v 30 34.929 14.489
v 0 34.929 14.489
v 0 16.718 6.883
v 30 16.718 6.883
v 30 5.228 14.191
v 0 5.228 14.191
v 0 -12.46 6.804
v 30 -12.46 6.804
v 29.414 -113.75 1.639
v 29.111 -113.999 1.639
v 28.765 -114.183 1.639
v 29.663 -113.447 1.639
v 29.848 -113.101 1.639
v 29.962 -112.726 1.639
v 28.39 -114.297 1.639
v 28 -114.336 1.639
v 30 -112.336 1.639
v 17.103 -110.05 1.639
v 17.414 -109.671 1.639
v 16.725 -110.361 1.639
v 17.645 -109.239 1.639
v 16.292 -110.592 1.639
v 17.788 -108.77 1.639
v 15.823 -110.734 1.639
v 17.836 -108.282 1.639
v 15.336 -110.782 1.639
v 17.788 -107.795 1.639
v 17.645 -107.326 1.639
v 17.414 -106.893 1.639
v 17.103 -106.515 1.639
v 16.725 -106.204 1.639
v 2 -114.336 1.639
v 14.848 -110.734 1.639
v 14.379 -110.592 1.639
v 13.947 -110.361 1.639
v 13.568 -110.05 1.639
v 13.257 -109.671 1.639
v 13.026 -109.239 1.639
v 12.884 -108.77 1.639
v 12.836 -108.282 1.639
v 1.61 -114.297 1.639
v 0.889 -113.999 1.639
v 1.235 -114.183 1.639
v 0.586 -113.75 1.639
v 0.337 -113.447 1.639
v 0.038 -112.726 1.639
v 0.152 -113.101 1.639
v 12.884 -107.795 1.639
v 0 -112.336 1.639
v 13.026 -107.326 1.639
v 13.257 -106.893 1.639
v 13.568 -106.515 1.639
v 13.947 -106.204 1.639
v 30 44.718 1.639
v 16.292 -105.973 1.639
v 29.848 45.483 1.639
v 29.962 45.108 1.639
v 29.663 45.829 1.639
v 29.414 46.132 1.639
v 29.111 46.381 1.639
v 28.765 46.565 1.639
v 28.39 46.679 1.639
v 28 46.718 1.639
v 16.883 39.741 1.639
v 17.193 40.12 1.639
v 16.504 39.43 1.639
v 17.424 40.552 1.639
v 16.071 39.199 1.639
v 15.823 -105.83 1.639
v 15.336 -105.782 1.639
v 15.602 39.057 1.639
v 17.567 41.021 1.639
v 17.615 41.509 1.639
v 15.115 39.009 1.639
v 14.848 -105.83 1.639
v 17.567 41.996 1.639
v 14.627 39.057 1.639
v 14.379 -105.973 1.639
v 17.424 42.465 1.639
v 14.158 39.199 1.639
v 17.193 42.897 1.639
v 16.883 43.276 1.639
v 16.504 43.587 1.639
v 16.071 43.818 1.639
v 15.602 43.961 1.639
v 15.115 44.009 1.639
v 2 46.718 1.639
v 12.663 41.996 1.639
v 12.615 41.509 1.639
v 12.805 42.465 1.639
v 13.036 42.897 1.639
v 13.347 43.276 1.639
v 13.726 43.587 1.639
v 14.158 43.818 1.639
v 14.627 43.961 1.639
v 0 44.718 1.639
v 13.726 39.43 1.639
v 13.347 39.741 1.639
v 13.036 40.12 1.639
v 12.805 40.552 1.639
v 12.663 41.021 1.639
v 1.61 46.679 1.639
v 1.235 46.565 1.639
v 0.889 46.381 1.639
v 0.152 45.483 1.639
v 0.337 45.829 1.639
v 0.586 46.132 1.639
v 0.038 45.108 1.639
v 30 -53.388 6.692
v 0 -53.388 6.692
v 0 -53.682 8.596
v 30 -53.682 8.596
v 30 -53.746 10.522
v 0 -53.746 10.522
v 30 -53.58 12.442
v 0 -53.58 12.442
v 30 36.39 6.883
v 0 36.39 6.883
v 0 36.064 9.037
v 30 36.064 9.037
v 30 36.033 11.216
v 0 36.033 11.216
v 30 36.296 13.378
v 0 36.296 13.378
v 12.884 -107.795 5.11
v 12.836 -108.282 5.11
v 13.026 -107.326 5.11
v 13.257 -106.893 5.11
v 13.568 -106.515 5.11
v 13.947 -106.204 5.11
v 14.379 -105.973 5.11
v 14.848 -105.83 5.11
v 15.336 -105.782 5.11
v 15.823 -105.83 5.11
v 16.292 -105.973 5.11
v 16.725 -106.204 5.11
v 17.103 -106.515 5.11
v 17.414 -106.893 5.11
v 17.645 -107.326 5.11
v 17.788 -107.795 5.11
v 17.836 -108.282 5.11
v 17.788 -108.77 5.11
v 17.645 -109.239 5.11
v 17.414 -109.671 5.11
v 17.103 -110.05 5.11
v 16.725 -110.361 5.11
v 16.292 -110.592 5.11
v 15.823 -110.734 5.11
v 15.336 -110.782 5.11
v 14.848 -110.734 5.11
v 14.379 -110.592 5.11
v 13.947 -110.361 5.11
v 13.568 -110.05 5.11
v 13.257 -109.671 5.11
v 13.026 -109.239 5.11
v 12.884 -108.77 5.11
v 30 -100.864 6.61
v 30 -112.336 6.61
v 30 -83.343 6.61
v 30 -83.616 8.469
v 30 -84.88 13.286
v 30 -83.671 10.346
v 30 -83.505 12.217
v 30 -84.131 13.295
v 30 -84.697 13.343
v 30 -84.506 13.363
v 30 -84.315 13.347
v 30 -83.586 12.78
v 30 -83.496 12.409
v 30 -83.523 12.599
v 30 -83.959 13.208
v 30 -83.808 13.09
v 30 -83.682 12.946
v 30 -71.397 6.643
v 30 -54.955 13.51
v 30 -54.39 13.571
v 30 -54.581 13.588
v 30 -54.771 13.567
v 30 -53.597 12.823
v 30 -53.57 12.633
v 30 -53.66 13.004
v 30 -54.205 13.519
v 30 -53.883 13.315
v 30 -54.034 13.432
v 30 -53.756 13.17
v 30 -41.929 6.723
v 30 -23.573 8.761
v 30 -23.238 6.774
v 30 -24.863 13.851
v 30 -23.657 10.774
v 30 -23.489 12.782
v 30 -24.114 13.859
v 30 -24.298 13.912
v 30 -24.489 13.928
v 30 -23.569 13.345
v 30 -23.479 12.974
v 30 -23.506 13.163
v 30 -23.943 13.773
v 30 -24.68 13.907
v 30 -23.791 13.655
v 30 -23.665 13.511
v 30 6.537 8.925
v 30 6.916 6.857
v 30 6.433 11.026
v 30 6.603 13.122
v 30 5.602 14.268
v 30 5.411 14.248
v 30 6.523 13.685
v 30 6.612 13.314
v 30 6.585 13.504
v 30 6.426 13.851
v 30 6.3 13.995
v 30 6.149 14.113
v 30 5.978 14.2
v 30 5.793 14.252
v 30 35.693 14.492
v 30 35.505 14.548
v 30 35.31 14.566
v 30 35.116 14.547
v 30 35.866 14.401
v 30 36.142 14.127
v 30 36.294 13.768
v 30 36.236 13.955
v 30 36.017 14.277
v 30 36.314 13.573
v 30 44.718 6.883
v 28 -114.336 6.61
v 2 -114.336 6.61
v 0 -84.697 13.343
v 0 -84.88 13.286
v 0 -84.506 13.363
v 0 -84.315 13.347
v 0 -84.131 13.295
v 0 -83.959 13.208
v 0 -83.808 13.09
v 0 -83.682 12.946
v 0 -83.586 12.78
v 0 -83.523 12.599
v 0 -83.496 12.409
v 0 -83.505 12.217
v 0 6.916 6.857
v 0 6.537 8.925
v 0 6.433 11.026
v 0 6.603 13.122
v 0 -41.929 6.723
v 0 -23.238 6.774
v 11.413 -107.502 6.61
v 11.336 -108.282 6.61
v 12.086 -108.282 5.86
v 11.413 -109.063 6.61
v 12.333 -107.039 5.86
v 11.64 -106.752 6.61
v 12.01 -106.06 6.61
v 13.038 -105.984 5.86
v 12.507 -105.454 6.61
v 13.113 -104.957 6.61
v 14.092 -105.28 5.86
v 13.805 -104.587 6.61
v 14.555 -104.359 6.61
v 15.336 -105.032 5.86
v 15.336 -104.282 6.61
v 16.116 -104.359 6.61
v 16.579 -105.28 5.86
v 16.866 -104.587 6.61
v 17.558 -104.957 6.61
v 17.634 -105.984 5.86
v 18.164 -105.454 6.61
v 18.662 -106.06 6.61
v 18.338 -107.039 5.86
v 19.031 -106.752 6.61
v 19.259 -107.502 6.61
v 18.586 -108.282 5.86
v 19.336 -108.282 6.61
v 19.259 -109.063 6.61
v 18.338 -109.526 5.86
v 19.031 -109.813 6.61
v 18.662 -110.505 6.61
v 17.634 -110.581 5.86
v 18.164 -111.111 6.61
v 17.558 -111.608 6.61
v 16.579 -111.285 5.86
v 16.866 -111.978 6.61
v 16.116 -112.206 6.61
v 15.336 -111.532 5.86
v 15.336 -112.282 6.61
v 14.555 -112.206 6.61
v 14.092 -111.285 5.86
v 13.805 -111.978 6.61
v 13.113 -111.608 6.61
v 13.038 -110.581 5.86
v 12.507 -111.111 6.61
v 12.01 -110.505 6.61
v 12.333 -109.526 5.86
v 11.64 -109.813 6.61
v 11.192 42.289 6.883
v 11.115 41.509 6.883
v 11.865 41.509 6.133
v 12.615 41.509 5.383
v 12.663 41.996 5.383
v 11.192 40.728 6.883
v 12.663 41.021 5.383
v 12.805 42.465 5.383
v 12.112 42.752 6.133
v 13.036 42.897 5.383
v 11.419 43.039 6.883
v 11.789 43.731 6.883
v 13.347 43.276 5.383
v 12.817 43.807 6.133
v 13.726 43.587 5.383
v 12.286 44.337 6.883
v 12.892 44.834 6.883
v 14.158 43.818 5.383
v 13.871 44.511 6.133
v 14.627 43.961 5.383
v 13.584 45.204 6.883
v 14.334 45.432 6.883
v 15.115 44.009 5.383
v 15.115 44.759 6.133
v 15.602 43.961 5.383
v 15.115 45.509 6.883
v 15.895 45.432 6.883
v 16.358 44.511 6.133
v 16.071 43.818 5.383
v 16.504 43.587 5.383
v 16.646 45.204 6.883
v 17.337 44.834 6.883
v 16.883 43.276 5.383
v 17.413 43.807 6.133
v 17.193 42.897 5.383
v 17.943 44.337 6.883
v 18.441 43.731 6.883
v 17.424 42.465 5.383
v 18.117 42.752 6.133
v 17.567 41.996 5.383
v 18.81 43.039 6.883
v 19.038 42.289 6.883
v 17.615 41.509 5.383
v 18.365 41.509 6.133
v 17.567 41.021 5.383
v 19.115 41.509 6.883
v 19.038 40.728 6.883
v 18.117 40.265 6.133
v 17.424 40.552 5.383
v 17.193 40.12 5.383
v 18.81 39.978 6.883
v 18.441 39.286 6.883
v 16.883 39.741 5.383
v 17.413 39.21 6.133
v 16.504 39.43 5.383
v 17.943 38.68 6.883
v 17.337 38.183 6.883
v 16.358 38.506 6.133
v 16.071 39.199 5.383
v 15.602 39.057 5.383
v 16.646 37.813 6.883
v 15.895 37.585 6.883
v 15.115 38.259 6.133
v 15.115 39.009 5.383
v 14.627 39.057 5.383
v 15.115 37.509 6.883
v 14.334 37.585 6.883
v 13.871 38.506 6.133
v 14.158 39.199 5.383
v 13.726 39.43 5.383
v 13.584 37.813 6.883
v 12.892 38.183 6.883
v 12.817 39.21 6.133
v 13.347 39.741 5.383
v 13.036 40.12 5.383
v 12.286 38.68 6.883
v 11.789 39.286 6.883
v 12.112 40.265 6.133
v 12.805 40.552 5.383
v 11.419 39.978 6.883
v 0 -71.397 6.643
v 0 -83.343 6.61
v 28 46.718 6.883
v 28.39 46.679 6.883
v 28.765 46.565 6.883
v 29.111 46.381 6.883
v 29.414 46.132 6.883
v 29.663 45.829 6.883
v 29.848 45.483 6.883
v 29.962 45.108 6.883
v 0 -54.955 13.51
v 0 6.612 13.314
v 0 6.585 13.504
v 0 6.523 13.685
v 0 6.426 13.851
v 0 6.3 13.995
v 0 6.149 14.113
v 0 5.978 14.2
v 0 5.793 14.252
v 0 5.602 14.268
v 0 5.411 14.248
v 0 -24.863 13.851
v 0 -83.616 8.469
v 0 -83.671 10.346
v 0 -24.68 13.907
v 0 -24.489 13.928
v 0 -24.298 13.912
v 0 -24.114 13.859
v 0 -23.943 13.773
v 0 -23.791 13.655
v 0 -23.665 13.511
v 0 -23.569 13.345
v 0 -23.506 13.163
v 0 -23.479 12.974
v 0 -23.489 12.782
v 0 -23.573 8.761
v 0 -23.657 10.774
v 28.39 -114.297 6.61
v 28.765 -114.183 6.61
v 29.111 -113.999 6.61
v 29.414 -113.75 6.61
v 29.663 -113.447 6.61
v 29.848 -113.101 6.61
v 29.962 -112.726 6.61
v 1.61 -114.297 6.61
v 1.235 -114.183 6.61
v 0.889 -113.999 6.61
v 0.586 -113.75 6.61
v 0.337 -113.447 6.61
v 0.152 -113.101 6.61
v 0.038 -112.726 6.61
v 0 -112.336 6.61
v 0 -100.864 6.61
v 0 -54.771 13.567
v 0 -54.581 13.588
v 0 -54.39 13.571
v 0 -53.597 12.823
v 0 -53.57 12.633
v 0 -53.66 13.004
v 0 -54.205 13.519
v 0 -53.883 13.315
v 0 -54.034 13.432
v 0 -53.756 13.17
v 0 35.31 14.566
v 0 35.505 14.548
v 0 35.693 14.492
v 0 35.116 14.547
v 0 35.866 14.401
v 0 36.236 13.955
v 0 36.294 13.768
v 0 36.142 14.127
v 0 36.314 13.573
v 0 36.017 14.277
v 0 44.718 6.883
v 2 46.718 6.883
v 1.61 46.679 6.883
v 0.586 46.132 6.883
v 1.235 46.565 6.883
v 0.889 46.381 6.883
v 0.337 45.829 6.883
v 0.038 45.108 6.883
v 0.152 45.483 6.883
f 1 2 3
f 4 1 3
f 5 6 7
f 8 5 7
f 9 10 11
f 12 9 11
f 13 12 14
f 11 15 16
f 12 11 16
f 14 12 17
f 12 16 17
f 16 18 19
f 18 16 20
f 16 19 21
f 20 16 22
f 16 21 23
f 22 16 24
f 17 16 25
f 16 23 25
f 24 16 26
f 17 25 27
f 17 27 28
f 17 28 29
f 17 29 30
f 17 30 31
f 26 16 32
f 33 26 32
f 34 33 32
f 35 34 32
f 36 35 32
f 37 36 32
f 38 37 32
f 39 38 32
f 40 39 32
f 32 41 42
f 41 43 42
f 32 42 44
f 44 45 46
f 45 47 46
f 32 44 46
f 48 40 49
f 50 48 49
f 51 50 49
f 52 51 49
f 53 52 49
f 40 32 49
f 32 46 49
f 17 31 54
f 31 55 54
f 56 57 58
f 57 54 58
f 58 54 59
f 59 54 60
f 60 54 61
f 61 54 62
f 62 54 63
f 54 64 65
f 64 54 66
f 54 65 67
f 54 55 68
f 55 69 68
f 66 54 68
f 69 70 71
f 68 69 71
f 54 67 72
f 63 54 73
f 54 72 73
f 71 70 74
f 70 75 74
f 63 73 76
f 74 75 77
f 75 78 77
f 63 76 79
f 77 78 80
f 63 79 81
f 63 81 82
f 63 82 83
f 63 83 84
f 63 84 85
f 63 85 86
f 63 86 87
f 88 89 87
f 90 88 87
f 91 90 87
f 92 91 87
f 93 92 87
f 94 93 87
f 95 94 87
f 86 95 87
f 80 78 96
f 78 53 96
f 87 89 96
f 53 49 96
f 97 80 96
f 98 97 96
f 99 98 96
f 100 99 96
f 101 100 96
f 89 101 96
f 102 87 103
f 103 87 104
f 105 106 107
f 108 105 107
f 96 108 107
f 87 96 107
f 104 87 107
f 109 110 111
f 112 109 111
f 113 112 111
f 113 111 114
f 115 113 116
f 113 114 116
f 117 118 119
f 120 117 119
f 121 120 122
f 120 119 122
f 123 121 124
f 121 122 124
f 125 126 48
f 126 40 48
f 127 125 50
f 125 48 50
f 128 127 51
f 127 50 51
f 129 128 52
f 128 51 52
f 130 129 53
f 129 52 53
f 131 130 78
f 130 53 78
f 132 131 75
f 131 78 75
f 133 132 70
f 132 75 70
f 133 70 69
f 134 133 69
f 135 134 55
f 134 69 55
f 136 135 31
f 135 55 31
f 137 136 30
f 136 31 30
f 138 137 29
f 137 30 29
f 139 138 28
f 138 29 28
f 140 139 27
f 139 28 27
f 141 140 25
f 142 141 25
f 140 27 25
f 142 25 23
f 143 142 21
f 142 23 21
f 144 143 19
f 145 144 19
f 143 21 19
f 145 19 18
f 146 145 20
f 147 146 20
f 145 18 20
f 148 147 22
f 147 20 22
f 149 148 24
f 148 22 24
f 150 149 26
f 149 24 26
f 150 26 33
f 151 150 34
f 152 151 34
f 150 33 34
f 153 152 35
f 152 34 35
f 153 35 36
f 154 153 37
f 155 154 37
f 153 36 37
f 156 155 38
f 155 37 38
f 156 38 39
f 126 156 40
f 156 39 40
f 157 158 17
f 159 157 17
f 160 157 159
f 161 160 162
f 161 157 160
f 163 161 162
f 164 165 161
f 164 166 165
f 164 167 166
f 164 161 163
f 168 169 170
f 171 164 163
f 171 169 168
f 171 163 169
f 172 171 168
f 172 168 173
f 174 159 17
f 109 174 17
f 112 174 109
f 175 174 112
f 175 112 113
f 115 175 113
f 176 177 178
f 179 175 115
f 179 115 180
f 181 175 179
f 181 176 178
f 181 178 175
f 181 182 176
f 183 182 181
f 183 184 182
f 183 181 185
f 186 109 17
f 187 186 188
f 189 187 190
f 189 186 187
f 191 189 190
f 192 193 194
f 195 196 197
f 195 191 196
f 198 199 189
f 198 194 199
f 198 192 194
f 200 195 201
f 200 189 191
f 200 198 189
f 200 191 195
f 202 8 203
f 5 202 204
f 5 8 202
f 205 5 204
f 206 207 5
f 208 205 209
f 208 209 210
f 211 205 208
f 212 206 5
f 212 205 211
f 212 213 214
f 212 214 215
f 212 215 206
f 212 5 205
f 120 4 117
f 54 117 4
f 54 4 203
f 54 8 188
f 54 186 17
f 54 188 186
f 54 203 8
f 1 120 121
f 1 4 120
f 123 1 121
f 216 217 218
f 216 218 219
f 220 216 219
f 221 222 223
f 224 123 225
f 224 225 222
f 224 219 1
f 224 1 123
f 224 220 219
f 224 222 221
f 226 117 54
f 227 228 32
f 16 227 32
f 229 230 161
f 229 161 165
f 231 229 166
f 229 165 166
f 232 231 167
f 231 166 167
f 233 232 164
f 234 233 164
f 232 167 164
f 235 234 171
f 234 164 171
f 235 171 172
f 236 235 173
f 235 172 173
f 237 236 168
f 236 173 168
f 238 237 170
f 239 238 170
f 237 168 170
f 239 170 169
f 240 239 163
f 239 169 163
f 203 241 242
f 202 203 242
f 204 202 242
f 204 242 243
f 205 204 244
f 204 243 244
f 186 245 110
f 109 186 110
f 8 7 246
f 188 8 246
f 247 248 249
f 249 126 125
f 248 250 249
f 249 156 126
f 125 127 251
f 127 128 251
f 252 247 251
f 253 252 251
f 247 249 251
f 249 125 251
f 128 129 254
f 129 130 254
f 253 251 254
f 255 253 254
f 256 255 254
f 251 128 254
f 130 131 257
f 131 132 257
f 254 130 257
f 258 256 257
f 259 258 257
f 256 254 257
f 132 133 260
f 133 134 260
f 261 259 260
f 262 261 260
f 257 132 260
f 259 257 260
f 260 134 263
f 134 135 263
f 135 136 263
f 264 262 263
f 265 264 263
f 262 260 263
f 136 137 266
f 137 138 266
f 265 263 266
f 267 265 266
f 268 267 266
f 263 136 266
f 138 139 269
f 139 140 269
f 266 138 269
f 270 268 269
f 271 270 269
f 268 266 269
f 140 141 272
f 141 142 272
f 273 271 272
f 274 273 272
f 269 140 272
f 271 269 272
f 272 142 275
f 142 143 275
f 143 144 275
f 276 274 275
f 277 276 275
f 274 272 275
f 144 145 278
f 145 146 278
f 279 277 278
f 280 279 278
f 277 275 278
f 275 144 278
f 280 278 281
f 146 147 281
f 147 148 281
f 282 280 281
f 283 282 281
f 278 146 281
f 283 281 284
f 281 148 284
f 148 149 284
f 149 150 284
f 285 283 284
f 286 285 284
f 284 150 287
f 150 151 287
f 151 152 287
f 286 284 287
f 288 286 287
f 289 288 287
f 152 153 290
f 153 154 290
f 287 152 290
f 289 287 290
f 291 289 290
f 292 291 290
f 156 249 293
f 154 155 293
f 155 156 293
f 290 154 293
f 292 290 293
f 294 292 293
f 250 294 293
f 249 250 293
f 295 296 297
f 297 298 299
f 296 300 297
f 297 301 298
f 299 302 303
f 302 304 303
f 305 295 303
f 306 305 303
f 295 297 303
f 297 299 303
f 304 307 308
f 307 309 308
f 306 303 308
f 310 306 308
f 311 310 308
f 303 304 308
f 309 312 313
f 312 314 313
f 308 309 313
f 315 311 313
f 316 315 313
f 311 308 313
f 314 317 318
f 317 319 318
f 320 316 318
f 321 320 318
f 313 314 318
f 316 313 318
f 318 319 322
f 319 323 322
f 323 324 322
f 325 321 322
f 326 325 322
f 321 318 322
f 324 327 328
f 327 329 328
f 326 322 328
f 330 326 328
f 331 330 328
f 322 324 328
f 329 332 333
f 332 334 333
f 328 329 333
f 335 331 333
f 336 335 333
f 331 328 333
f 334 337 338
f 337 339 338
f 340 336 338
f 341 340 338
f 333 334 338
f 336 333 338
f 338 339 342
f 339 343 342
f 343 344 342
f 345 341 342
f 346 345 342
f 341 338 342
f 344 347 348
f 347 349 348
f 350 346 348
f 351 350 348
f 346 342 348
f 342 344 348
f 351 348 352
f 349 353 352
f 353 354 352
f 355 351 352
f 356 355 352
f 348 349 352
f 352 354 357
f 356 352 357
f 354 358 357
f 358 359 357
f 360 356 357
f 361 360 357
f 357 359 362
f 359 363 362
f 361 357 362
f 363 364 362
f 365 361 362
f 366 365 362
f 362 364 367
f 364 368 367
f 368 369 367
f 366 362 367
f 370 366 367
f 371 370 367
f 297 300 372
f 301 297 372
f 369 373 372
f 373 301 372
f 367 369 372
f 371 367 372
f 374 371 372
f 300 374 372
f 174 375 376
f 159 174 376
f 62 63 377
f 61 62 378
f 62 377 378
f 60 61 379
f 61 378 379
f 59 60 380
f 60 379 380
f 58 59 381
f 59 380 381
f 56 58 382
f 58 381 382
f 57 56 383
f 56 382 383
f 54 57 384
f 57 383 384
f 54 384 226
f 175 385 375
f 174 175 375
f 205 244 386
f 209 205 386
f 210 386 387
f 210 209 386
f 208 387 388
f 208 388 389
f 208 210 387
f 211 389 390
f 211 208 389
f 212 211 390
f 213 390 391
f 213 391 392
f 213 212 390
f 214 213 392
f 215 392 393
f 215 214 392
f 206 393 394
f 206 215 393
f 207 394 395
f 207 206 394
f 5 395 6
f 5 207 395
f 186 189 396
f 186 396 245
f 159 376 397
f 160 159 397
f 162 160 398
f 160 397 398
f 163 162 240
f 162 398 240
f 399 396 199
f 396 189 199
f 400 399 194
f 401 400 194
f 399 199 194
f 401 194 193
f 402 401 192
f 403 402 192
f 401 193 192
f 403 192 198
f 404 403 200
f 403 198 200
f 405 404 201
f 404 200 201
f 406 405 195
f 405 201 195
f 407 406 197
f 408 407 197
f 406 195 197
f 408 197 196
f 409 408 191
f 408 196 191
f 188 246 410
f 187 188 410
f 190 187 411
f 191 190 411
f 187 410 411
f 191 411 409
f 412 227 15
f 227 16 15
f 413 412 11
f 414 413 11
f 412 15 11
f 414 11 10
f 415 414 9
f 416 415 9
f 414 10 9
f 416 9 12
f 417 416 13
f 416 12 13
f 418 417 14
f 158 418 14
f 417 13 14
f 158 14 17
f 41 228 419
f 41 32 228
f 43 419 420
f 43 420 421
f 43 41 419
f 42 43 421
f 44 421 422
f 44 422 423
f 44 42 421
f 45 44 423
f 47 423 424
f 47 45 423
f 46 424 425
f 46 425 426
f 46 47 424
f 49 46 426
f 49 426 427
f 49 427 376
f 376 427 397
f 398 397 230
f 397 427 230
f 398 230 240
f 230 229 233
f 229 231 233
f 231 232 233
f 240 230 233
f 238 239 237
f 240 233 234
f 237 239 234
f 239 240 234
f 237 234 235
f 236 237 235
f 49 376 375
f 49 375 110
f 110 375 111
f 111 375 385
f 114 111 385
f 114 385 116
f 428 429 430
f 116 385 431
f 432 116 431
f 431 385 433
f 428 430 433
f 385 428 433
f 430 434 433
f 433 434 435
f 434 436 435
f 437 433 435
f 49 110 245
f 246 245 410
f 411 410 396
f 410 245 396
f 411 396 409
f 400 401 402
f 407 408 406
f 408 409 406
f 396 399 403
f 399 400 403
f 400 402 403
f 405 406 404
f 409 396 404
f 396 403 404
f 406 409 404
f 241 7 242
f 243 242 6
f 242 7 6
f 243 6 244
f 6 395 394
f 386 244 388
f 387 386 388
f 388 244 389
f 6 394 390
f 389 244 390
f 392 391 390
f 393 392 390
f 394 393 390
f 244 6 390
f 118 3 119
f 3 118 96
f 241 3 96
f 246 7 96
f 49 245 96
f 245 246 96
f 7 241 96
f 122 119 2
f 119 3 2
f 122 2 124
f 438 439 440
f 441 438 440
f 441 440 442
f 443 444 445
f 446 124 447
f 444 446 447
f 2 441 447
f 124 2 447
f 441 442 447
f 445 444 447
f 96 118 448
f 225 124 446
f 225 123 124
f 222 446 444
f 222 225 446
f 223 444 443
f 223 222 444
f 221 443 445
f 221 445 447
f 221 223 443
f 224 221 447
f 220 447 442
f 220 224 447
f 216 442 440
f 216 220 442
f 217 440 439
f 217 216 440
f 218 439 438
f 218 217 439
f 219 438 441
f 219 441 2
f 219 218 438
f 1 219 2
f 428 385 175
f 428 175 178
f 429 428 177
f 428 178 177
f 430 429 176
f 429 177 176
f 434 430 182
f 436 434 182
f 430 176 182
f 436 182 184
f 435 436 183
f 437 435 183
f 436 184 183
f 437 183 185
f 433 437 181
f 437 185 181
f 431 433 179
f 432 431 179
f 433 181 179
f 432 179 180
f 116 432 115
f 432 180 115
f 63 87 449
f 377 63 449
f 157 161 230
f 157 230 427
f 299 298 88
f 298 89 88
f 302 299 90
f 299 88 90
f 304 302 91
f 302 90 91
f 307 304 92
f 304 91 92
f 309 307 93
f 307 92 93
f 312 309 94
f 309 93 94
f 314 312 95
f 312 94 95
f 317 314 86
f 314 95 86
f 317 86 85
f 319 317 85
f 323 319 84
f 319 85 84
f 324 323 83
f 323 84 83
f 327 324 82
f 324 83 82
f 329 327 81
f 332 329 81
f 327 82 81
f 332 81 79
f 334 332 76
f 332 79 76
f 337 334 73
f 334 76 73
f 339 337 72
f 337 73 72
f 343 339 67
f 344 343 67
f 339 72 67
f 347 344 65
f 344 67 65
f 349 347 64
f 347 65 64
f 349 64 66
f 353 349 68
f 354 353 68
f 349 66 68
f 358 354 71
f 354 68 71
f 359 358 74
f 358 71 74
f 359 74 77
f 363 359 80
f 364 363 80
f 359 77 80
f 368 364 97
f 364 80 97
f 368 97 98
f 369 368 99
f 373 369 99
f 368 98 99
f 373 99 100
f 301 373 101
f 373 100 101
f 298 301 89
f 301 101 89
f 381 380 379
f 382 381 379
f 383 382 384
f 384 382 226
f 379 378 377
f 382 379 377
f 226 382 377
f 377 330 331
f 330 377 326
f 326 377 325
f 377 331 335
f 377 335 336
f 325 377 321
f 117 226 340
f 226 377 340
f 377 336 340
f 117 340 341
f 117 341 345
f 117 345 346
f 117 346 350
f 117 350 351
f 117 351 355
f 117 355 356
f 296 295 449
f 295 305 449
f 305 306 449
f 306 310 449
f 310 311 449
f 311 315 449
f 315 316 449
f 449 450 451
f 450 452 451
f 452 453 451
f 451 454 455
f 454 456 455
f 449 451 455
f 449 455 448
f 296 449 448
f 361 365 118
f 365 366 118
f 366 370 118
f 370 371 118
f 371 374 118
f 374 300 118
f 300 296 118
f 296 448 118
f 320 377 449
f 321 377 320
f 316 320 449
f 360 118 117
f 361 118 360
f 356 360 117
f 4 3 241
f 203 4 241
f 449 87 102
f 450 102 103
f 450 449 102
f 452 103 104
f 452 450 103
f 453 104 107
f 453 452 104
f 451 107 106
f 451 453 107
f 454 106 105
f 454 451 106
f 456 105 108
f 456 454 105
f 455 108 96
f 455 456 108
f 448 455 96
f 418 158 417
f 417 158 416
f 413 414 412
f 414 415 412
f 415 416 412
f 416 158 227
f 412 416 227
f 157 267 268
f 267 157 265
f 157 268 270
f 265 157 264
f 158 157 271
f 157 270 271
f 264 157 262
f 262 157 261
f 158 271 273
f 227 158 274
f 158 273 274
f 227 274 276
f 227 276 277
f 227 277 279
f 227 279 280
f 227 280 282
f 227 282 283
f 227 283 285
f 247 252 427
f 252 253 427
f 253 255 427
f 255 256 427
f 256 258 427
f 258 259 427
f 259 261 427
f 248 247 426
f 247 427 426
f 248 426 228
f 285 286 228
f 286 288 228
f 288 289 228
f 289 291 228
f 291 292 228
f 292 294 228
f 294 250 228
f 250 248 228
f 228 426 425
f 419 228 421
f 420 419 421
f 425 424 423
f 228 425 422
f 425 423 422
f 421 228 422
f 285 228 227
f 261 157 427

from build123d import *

# Parameters (mm, degrees)
F1_DEPTH       = 30
F2_R           = 2
F3_R           = 1
F5_D           = 5
F5_CSINK_D     = 8
F5_CSINK_ANGLE = 90
F7_D           = 5
F7_CSINK_D     = 8
F7_CSINK_ANGLE = 90


with BuildPart() as f1:
    # F0 (on Right) → F1 (new body)
    with BuildSketch(Plane.YZ):
        with BuildLine():
            Line((-114.335611, 1.639002), (-103.282312, 1.639002))
            Line((-103.282312, 1.639002), (-103.19238, 1.639002))
            Line((-103.19238, 1.639002), (36.717688, 1.639002))
            Line((36.717688, 1.639002), (46.717688, 1.639002))
            Line((46.717688, 1.639002), (46.717688, 5.639002))
            Line((46.717688, 5.639002), (46.717688, 6.883289))
            Line((46.717688, 6.883289), (36.389513, 6.883289))
            ThreePointArc((36.389513, 6.883289), (36.026758, 11.097664), (36.776017, 15.260735))
            Line((36.776017, 15.260735), (16.717688, 6.883289))
            Line((16.717688, 6.883289), (6.915737, 6.856559))
            ThreePointArc((6.915737, 6.856559), (6.430977, 10.892172), (6.974065, 14.92035))
            Line((6.974065, 14.92035), (-12.459779, 6.803723))
            Line((-12.459779, 6.803723), (-23.238242, 6.77433))
            ThreePointArc((-23.238242, 6.77433), (-23.658847, 10.684605), (-23.117268, 14.579968))
            Line((-23.117268, 14.579968), (-41.928537, 6.723361))
            Line((-41.928537, 6.723361), (-53.387725, 6.692112))
            ThreePointArc((-53.387725, 6.692112), (-53.747579, 10.476515), (-53.208595, 14.239585))
            Line((-53.208595, 14.239585), (-71.397287, 6.643))
            Line((-71.397287, 6.643), (-83.343368, 6.610423))
            ThreePointArc((-83.343368, 6.610423), (-83.671143, 10.325154), (-83.134051, 14.015437))
            Line((-83.134051, 14.015437), (-100.864061, 6.610423))
            Line((-100.864061, 6.610423), (-114.335611, 6.610423))
            Line((-114.335611, 6.610423), (-114.335611, 1.639002))
        make_face()
    extrude(amount=F1_DEPTH)

    # F2
    f2_edges = [f1.edges().sort_by_distance(p)[0] for p in [
        (0, -114.335611, 4.124713),
        (30, -114.335611, 4.124713),
        (0, 46.717688, 4.261146),
        (30, 46.717688, 4.261146),
    ]]
    fillet(f2_edges, radius=F2_R)

    # F3
    f3_edges = [f1.edges().sort_by_distance(p)[0] for p in [
        (15, 36.776017, 15.260735),
        (15, 6.974065, 14.92035),
        (15, -23.117268, 14.579968),
        (15, -53.208595, 14.239585),
        (15, -83.134051, 14.015437),
    ]]
    fillet(f3_edges, radius=F3_R)

    # F5 (through all)
    with Locations(Plane.XY.offset(6.610423)):
        with Locations((15.335711, -108.282417)):
            CounterSinkHole(F5_D / 2, F5_CSINK_D / 2, counter_sink_angle=F5_CSINK_ANGLE)

    # F7 (through all)
    with Locations(Plane.XY.offset(6.883289)):
        with Locations((15.114769, 41.508552)):
            CounterSinkHole(F7_D / 2, F7_CSINK_D / 2, counter_sink_angle=F7_CSINK_ANGLE)


solid = f1.part
